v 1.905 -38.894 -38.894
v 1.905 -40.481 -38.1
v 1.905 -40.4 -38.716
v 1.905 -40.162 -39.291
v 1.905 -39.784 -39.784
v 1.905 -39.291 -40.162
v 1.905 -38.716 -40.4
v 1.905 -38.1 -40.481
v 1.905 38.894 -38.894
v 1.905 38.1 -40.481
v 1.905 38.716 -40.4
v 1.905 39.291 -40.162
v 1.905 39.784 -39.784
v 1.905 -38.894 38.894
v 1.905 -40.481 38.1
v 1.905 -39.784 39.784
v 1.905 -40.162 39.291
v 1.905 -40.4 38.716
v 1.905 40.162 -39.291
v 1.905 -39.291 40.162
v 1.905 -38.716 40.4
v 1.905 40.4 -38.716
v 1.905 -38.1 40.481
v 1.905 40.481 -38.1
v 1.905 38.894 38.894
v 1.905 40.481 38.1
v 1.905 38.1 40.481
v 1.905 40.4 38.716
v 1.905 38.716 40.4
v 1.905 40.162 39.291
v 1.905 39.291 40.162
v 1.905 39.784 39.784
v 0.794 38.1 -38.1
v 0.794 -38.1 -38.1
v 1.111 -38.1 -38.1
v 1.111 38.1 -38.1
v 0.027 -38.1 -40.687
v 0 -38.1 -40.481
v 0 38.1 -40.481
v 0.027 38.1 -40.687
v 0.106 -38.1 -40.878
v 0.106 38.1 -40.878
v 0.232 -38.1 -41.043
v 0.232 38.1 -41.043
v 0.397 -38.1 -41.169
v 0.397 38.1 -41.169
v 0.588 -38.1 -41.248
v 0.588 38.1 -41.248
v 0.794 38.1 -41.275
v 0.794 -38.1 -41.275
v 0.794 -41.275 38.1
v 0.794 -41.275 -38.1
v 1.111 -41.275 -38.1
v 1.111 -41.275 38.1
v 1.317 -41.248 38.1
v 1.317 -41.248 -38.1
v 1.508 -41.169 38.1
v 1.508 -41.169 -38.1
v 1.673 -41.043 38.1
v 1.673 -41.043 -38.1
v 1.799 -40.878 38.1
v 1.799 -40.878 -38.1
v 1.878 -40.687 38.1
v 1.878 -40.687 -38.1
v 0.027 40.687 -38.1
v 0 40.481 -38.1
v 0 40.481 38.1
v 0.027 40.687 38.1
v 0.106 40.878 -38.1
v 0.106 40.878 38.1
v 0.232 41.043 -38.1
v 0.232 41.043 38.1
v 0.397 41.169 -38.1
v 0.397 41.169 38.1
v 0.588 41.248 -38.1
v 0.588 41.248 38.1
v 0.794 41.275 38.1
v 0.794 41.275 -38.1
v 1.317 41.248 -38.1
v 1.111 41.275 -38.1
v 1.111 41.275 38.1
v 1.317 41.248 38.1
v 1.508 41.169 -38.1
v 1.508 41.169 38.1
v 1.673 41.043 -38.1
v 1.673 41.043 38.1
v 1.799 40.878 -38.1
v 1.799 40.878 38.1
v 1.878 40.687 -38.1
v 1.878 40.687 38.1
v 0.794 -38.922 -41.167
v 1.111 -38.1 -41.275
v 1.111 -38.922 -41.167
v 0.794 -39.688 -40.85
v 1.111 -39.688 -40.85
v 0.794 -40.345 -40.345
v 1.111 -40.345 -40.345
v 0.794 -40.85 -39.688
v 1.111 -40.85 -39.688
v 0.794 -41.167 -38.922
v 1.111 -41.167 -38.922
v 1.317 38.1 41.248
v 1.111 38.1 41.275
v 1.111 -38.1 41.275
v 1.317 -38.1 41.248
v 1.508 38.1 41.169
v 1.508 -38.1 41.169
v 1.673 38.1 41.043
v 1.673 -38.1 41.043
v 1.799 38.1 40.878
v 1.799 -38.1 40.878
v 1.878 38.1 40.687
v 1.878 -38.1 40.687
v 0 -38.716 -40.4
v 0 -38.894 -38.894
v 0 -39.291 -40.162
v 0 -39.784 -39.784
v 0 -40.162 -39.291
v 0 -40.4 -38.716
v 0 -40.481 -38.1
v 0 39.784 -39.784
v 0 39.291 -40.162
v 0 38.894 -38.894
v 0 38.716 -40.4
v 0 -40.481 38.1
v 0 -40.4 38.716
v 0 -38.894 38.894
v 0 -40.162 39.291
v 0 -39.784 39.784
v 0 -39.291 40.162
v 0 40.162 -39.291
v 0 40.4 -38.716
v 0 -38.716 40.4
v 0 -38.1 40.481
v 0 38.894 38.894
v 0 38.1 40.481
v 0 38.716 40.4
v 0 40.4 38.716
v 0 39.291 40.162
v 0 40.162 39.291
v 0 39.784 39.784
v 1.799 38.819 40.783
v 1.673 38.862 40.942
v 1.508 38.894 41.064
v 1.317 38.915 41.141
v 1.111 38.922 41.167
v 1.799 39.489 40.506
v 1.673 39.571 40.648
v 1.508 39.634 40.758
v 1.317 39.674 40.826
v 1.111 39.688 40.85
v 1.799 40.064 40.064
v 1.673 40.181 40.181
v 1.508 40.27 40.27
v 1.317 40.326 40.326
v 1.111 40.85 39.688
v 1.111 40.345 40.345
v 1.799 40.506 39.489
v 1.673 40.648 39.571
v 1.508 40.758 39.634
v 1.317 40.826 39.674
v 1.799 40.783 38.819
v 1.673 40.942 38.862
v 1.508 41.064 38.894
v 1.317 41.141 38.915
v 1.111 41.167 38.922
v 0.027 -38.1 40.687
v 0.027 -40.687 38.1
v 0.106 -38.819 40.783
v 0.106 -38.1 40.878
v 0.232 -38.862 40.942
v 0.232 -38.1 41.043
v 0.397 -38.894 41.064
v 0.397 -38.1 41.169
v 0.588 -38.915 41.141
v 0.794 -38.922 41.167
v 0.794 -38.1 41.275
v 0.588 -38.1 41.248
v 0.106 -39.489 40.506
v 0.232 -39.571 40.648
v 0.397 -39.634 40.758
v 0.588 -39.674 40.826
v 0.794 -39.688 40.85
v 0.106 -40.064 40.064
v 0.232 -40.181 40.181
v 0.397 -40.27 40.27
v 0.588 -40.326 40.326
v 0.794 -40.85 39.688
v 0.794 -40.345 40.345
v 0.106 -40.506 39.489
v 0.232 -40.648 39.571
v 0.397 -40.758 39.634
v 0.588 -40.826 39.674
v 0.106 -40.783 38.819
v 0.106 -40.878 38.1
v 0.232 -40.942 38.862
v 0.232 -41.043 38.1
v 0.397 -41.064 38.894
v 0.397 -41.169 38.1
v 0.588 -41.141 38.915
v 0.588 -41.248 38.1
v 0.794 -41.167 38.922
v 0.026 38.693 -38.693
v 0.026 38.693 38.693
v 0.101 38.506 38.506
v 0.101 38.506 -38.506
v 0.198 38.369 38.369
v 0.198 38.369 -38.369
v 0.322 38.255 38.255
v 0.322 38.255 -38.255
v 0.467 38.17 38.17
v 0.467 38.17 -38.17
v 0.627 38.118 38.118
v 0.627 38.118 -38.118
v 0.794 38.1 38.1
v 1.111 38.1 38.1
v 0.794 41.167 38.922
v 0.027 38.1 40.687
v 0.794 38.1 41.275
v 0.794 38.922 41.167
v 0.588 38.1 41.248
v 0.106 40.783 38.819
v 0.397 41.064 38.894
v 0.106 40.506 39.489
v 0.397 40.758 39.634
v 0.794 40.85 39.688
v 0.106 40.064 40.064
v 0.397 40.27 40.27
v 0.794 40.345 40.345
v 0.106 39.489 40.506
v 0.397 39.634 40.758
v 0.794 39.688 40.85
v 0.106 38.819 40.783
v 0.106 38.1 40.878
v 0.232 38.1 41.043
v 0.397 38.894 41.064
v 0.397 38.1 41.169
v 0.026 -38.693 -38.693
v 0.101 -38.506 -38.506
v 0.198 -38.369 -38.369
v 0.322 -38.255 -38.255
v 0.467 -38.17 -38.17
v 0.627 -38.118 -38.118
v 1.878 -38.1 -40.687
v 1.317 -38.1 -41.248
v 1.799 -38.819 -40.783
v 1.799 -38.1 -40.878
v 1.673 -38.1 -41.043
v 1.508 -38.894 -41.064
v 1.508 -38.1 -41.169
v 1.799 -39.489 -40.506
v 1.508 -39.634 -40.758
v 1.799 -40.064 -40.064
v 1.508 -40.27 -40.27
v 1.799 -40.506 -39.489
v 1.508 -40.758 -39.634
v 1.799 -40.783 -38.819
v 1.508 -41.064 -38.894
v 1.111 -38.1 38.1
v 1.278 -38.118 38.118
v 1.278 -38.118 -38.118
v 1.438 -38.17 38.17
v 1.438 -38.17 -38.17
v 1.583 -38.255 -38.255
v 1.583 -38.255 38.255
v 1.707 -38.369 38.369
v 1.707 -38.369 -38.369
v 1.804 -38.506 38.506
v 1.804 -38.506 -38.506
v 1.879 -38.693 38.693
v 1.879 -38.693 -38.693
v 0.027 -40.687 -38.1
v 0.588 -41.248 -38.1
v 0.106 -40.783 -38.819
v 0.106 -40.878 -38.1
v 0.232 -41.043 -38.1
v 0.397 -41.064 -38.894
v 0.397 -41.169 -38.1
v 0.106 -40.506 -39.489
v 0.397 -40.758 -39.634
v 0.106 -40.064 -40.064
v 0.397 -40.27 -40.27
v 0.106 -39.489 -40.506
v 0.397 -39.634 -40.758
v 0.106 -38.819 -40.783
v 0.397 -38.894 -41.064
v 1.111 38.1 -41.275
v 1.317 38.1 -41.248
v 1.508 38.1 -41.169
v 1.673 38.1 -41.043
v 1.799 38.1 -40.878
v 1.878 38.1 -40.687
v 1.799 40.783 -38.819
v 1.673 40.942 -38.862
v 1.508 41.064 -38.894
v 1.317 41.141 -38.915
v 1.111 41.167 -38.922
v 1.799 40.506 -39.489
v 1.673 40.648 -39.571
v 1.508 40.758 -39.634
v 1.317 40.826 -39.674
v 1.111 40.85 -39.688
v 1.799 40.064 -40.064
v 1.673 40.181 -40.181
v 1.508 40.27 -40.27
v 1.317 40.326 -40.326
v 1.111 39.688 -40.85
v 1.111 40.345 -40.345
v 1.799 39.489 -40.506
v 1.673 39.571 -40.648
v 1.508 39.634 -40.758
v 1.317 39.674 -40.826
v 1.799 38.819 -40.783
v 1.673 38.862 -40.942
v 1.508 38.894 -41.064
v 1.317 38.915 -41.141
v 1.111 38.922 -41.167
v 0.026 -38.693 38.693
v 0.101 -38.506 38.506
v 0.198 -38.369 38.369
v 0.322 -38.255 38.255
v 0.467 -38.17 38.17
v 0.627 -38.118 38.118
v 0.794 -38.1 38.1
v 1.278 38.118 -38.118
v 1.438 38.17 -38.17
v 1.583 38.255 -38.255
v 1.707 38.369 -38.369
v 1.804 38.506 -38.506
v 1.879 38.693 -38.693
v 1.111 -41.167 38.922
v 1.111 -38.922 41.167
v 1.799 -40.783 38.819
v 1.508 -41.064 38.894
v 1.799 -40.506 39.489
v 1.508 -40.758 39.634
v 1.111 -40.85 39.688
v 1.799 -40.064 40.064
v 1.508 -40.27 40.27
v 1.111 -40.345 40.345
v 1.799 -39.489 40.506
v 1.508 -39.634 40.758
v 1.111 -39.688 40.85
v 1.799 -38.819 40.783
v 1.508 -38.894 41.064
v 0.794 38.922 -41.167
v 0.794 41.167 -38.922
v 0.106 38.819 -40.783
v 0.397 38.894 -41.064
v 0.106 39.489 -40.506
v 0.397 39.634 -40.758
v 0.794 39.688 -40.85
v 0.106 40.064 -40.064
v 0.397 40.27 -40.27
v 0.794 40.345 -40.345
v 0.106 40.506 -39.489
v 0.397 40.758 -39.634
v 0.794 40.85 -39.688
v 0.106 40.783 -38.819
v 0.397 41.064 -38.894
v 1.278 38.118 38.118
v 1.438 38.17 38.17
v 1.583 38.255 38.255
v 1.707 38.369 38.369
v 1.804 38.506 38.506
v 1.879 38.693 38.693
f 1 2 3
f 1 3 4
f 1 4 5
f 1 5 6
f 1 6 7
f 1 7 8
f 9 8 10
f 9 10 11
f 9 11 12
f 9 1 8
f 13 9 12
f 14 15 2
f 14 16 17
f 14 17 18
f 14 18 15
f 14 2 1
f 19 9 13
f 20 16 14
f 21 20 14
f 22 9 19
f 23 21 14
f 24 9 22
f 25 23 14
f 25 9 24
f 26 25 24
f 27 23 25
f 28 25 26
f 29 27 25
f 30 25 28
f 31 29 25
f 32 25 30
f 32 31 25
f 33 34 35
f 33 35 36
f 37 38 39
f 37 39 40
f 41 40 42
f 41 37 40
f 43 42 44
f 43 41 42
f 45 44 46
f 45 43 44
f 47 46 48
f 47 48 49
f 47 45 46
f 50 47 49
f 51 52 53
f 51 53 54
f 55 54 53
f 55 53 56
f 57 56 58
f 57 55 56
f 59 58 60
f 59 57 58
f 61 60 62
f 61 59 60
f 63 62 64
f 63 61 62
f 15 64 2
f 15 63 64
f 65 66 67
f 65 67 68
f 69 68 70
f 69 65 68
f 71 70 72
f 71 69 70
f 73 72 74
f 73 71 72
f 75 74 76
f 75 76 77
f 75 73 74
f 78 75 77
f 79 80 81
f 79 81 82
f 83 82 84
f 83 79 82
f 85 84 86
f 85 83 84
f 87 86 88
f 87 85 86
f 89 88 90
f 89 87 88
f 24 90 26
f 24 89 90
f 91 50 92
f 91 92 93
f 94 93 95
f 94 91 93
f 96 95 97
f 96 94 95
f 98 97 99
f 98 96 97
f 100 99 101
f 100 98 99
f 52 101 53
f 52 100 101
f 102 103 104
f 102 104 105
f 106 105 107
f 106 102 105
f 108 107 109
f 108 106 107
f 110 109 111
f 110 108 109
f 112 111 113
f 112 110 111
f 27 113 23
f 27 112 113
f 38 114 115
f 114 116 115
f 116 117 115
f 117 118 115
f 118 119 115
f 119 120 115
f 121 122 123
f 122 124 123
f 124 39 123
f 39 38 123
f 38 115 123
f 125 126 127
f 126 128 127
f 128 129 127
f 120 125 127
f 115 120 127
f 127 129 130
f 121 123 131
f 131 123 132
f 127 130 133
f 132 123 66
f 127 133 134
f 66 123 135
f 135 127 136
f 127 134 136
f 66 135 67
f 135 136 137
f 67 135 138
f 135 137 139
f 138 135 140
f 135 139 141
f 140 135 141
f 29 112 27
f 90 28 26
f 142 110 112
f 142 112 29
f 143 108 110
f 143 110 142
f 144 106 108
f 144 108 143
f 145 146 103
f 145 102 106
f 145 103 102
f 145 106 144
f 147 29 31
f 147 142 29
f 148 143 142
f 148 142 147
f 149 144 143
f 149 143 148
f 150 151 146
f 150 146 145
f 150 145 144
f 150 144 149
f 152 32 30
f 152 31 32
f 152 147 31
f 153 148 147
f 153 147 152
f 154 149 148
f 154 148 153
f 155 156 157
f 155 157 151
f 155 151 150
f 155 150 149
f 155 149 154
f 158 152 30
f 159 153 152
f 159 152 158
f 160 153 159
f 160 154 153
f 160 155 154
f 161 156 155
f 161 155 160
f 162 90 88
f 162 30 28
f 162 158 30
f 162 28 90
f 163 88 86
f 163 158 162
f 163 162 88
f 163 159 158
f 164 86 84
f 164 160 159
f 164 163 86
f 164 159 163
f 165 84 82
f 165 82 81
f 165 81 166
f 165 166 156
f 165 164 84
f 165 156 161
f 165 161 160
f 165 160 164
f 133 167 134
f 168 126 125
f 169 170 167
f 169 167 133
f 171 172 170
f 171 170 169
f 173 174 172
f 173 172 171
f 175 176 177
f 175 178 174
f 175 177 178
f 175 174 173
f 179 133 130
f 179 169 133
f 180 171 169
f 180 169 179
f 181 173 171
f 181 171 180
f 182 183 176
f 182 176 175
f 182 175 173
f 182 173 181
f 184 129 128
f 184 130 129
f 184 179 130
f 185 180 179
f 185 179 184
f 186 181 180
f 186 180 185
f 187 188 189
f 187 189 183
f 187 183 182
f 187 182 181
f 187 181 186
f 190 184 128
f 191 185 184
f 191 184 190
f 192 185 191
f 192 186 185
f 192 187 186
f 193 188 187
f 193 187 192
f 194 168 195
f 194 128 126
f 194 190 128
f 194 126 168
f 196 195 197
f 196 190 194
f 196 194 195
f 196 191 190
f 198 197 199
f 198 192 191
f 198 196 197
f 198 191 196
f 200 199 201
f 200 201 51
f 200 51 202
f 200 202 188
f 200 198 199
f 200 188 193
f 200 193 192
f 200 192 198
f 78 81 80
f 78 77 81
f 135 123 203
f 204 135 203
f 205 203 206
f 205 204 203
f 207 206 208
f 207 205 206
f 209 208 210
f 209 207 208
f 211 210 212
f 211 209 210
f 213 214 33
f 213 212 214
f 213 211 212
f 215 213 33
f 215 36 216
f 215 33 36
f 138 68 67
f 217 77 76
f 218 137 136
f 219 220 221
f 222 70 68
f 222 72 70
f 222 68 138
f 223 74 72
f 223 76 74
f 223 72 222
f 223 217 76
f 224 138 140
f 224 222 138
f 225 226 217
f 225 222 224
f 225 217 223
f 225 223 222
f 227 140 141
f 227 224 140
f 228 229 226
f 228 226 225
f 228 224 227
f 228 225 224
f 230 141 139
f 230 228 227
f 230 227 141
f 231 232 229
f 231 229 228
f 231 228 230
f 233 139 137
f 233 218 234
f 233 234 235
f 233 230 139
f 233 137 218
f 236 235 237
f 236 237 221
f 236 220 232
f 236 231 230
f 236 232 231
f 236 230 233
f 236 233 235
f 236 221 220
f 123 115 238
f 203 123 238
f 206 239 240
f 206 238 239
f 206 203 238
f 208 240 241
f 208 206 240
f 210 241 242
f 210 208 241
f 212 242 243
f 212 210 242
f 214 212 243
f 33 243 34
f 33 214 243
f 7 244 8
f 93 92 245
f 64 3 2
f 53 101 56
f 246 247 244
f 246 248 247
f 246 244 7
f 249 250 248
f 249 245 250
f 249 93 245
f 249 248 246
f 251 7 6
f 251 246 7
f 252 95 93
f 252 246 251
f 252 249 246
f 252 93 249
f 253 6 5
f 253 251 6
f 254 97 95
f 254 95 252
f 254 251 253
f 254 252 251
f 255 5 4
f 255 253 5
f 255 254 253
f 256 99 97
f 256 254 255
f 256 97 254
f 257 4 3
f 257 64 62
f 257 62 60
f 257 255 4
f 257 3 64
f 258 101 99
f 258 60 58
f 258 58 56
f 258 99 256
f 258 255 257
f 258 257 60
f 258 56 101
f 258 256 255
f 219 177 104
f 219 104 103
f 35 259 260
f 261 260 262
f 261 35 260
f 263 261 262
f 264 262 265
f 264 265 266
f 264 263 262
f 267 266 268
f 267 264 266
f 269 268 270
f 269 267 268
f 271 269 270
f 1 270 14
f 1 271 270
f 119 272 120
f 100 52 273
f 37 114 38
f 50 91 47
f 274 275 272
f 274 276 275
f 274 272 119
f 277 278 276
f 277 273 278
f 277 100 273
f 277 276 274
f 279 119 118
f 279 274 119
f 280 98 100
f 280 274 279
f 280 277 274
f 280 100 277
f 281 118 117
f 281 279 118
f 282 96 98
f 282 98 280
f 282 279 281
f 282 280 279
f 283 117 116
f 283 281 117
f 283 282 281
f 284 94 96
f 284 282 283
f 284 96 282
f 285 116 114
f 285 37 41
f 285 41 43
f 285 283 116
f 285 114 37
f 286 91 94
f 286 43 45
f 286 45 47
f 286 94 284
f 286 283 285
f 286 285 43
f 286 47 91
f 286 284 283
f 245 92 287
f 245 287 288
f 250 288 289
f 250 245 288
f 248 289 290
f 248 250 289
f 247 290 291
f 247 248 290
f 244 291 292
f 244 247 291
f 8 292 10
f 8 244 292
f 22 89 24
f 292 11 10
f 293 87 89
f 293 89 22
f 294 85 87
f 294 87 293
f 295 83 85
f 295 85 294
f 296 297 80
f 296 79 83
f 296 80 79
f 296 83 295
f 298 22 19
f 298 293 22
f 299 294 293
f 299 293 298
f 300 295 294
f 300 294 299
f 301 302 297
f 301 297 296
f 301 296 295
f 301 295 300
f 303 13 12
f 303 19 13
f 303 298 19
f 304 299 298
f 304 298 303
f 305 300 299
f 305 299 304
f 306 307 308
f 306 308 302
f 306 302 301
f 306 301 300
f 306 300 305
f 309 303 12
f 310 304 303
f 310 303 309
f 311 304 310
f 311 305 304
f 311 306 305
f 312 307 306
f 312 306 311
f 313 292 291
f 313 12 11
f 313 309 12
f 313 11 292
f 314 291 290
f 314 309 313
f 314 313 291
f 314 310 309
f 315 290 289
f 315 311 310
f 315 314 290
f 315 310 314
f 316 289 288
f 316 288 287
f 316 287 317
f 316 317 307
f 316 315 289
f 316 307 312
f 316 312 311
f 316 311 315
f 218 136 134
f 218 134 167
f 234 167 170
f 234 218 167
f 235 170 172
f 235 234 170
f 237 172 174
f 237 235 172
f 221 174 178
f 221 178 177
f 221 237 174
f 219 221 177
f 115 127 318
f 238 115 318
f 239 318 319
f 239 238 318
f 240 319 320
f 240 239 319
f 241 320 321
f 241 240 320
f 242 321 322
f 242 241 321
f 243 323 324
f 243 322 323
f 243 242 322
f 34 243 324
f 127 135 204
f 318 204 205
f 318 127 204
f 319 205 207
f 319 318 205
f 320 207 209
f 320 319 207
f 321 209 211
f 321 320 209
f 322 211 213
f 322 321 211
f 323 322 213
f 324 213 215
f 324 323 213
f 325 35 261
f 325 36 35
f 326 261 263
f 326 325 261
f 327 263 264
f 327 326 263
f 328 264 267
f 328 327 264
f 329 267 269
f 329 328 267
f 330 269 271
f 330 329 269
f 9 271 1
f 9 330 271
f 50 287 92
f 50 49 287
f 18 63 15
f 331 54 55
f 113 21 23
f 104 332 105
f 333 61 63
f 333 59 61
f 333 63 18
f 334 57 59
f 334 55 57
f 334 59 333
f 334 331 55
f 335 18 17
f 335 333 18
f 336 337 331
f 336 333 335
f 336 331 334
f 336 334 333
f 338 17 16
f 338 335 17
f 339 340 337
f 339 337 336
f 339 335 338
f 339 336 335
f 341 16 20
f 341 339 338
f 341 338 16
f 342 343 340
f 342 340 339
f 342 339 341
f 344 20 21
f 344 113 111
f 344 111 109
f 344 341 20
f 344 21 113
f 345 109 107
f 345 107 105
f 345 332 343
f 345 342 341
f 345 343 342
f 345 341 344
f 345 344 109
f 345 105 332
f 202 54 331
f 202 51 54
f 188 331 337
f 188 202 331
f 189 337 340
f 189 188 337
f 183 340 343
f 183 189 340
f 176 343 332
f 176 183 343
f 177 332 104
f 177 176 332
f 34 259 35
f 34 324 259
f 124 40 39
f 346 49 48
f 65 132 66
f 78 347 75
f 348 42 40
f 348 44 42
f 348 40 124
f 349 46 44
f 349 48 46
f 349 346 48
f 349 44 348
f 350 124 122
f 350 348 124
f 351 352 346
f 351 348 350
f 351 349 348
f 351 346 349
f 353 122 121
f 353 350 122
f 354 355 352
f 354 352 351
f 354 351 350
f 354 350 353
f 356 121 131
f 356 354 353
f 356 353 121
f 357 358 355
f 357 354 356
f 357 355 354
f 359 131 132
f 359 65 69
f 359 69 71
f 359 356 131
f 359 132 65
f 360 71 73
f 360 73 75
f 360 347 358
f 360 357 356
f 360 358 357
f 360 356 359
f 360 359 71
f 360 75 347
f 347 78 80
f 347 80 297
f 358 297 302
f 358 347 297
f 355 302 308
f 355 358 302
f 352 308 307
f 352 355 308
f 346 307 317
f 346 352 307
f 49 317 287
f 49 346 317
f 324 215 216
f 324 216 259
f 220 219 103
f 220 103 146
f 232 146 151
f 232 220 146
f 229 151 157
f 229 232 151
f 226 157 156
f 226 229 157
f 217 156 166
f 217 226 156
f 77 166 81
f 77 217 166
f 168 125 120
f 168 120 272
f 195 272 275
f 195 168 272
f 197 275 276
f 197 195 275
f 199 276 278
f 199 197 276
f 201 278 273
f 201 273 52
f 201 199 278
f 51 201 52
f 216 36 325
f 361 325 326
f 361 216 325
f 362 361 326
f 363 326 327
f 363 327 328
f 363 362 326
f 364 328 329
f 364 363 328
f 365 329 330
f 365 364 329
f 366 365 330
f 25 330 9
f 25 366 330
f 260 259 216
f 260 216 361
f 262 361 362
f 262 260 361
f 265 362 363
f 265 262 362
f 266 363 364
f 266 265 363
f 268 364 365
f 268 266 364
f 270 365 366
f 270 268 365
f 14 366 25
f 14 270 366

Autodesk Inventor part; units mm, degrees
ref_plane "YZ Plane" through (0, 0, 0) normal (1, 0, 0) x (0, 1, 0)
ref_plane "XZ Plane" through (0, 0, 0) normal (0, 1, 0) x (-1, 0, 0)
ref_plane "XY Plane" through (0, 0, 0) normal (0, 0, 1) x (1, 0, 0)
sketch "Sketch1" plane through (0, 0, 0) normal (1, 0, 0) x (0, 1, 0)
  line L0 (-38.1, -38.1) -> (38.1, -38.1)
  line L1 (38.1, -38.1) -> (38.1, 38.1)
  line L2 (38.1, 38.1) -> (-38.1, 38.1)
  line L3 (-38.1, 38.1) -> (-38.1, -38.1)
  line L4 (-38.1, -38.1) -> (38.1, 38.1) construction
  line L5 (38.1, -38.1) -> (-38.1, 38.1) construction
  line L6 (-41.275, 41.275) -> (41.275, 41.275)
  line L7 (41.275, 41.275) -> (41.275, -41.275)
  line L8 (41.275, -41.275) -> (-41.275, -41.275)
  line L9 (-41.275, -41.275) -> (-41.275, 41.275)
  point P0 (0, 0)
  dimension "d0" = 76.2
  dimension "d1" = 76.2
  dimension "d2" = 3.175
extrude "Extrusion1" add sketch "Sketch1" along normal blind 1.905
fillet "Fillet1" radius 0.7937 16 edges at (1.905, 0, 41.275) (0, 0, 41.275) (1.905, 0, 38.1) (0, 0, 38.1) (1.905, 0, -38.1) (0, 0, -38.1) (1.905, 0, -41.275) (0, 0, -41.275) (1.905, -38.1, 0) (0, -38.1, 0) (1.905, 38.1, 0) (1.905, 41.275, 0) (0, 38.1, 0) (0, 41.275, 0) (1.905, -41.275, 0) (0, -41.275, 0)
fillet "Fillet2" radius 3.175 12 edges at (0.9525, 41.275, 41.275) (0.2325, 41.0425, 41.0425) (1.6725, 41.0425, 41.0425) (0.9525, -41.275, 41.275) (0.2325, -41.0425, 41.0425) (1.6725, -41.0425, 41.0425) (0.9525, -41.275, -41.275) (0.2325, -41.0425, -41.0425) (1.6725, -41.0425, -41.0425) (0.9525, 41.275, -41.275) (0.2325, 41.0425, -41.0425) (1.6725, 41.0425, -41.0425)
equation "\"d0\" = 0.25 * sensorHolderFlushORingID"
equation "\"d1\" = 0.25 * sensorHolderFlushORingID"
equation "\"d2\" = oRingWidth"
equation "\"d5\" = 0.25 * oRingWidth"
equation "\"d6\" = oRingWidth"
equation "\"acrylicThickness\" = 6.35"
equation "\"height\" = 101.6"
equation "\"width\" = 101.6"
equation "\"depth\" = 101.6"
equation "\"mirrorAngle\" = 5deg"
equation "\"detectorWidth\" = 52"
equation "\"detectorHeight\" = 52"
equation "\"mirrorThickness\" = 3"
equation "\"fresnelThickness\" = 0.1"
equation "\"focalLength\" = 76.2"
equation "\"ior\" = 1.49"
equation "\"centerThickness\" = 1.524"
equation "\"fresnelAngle\" = 90deg"
equation "\"fresnelEffectiveDiameter\" = 76.2"
equation "\"mirrorSuppourtWidth\" = 38.1"
equation "\"backGrooveBit\" = 4.8006"
equation "\"sensorHolderWidth\" = 88.9"
equation "\"sensorHolderHeight\" = 88.9"
equation "\"sensorHolderSensorHeight\" = 53.975"
equation "\"sensorHolderSensorWidth\" = 53.975"
equation "\"sensorHolderORing\" = 3.175"
equation "\"sensorHolderFlushORing\" = 3.175"
equation "\"sensorHolderFlushORingID\" = 304.8"
equation "\"frontBackORingID\" = 419.1"
equation "\"oRingWidth\" = 3.175"
equation "\"sensorHolderORingID\" = 203.2"
equation "\"topBottomHorizontalMirrorGroove\" = 12.7"
equation "\"backMirrorGroove\" = 6.35"
equation "\"mirrorGroove\" = 19.05"
equation "\"mirrorGrooveFillet\" = 6.35"
equation "\"fresnelChamfer\" = 6.35"
equation "\"mirrorGrooveDrill\" = 6.35"
equation "\"mirrorGrooveMill\" = 3.175"
equation "\"fresnelMirrorChamfer\" = 6.35"
equation "\"detectorOpeningWidth\" = 76.2"
equation "\"detectorOpeningHeight\" = 76.2"
properties part number "sesnorHolderFlushORing" material "Rubber"
